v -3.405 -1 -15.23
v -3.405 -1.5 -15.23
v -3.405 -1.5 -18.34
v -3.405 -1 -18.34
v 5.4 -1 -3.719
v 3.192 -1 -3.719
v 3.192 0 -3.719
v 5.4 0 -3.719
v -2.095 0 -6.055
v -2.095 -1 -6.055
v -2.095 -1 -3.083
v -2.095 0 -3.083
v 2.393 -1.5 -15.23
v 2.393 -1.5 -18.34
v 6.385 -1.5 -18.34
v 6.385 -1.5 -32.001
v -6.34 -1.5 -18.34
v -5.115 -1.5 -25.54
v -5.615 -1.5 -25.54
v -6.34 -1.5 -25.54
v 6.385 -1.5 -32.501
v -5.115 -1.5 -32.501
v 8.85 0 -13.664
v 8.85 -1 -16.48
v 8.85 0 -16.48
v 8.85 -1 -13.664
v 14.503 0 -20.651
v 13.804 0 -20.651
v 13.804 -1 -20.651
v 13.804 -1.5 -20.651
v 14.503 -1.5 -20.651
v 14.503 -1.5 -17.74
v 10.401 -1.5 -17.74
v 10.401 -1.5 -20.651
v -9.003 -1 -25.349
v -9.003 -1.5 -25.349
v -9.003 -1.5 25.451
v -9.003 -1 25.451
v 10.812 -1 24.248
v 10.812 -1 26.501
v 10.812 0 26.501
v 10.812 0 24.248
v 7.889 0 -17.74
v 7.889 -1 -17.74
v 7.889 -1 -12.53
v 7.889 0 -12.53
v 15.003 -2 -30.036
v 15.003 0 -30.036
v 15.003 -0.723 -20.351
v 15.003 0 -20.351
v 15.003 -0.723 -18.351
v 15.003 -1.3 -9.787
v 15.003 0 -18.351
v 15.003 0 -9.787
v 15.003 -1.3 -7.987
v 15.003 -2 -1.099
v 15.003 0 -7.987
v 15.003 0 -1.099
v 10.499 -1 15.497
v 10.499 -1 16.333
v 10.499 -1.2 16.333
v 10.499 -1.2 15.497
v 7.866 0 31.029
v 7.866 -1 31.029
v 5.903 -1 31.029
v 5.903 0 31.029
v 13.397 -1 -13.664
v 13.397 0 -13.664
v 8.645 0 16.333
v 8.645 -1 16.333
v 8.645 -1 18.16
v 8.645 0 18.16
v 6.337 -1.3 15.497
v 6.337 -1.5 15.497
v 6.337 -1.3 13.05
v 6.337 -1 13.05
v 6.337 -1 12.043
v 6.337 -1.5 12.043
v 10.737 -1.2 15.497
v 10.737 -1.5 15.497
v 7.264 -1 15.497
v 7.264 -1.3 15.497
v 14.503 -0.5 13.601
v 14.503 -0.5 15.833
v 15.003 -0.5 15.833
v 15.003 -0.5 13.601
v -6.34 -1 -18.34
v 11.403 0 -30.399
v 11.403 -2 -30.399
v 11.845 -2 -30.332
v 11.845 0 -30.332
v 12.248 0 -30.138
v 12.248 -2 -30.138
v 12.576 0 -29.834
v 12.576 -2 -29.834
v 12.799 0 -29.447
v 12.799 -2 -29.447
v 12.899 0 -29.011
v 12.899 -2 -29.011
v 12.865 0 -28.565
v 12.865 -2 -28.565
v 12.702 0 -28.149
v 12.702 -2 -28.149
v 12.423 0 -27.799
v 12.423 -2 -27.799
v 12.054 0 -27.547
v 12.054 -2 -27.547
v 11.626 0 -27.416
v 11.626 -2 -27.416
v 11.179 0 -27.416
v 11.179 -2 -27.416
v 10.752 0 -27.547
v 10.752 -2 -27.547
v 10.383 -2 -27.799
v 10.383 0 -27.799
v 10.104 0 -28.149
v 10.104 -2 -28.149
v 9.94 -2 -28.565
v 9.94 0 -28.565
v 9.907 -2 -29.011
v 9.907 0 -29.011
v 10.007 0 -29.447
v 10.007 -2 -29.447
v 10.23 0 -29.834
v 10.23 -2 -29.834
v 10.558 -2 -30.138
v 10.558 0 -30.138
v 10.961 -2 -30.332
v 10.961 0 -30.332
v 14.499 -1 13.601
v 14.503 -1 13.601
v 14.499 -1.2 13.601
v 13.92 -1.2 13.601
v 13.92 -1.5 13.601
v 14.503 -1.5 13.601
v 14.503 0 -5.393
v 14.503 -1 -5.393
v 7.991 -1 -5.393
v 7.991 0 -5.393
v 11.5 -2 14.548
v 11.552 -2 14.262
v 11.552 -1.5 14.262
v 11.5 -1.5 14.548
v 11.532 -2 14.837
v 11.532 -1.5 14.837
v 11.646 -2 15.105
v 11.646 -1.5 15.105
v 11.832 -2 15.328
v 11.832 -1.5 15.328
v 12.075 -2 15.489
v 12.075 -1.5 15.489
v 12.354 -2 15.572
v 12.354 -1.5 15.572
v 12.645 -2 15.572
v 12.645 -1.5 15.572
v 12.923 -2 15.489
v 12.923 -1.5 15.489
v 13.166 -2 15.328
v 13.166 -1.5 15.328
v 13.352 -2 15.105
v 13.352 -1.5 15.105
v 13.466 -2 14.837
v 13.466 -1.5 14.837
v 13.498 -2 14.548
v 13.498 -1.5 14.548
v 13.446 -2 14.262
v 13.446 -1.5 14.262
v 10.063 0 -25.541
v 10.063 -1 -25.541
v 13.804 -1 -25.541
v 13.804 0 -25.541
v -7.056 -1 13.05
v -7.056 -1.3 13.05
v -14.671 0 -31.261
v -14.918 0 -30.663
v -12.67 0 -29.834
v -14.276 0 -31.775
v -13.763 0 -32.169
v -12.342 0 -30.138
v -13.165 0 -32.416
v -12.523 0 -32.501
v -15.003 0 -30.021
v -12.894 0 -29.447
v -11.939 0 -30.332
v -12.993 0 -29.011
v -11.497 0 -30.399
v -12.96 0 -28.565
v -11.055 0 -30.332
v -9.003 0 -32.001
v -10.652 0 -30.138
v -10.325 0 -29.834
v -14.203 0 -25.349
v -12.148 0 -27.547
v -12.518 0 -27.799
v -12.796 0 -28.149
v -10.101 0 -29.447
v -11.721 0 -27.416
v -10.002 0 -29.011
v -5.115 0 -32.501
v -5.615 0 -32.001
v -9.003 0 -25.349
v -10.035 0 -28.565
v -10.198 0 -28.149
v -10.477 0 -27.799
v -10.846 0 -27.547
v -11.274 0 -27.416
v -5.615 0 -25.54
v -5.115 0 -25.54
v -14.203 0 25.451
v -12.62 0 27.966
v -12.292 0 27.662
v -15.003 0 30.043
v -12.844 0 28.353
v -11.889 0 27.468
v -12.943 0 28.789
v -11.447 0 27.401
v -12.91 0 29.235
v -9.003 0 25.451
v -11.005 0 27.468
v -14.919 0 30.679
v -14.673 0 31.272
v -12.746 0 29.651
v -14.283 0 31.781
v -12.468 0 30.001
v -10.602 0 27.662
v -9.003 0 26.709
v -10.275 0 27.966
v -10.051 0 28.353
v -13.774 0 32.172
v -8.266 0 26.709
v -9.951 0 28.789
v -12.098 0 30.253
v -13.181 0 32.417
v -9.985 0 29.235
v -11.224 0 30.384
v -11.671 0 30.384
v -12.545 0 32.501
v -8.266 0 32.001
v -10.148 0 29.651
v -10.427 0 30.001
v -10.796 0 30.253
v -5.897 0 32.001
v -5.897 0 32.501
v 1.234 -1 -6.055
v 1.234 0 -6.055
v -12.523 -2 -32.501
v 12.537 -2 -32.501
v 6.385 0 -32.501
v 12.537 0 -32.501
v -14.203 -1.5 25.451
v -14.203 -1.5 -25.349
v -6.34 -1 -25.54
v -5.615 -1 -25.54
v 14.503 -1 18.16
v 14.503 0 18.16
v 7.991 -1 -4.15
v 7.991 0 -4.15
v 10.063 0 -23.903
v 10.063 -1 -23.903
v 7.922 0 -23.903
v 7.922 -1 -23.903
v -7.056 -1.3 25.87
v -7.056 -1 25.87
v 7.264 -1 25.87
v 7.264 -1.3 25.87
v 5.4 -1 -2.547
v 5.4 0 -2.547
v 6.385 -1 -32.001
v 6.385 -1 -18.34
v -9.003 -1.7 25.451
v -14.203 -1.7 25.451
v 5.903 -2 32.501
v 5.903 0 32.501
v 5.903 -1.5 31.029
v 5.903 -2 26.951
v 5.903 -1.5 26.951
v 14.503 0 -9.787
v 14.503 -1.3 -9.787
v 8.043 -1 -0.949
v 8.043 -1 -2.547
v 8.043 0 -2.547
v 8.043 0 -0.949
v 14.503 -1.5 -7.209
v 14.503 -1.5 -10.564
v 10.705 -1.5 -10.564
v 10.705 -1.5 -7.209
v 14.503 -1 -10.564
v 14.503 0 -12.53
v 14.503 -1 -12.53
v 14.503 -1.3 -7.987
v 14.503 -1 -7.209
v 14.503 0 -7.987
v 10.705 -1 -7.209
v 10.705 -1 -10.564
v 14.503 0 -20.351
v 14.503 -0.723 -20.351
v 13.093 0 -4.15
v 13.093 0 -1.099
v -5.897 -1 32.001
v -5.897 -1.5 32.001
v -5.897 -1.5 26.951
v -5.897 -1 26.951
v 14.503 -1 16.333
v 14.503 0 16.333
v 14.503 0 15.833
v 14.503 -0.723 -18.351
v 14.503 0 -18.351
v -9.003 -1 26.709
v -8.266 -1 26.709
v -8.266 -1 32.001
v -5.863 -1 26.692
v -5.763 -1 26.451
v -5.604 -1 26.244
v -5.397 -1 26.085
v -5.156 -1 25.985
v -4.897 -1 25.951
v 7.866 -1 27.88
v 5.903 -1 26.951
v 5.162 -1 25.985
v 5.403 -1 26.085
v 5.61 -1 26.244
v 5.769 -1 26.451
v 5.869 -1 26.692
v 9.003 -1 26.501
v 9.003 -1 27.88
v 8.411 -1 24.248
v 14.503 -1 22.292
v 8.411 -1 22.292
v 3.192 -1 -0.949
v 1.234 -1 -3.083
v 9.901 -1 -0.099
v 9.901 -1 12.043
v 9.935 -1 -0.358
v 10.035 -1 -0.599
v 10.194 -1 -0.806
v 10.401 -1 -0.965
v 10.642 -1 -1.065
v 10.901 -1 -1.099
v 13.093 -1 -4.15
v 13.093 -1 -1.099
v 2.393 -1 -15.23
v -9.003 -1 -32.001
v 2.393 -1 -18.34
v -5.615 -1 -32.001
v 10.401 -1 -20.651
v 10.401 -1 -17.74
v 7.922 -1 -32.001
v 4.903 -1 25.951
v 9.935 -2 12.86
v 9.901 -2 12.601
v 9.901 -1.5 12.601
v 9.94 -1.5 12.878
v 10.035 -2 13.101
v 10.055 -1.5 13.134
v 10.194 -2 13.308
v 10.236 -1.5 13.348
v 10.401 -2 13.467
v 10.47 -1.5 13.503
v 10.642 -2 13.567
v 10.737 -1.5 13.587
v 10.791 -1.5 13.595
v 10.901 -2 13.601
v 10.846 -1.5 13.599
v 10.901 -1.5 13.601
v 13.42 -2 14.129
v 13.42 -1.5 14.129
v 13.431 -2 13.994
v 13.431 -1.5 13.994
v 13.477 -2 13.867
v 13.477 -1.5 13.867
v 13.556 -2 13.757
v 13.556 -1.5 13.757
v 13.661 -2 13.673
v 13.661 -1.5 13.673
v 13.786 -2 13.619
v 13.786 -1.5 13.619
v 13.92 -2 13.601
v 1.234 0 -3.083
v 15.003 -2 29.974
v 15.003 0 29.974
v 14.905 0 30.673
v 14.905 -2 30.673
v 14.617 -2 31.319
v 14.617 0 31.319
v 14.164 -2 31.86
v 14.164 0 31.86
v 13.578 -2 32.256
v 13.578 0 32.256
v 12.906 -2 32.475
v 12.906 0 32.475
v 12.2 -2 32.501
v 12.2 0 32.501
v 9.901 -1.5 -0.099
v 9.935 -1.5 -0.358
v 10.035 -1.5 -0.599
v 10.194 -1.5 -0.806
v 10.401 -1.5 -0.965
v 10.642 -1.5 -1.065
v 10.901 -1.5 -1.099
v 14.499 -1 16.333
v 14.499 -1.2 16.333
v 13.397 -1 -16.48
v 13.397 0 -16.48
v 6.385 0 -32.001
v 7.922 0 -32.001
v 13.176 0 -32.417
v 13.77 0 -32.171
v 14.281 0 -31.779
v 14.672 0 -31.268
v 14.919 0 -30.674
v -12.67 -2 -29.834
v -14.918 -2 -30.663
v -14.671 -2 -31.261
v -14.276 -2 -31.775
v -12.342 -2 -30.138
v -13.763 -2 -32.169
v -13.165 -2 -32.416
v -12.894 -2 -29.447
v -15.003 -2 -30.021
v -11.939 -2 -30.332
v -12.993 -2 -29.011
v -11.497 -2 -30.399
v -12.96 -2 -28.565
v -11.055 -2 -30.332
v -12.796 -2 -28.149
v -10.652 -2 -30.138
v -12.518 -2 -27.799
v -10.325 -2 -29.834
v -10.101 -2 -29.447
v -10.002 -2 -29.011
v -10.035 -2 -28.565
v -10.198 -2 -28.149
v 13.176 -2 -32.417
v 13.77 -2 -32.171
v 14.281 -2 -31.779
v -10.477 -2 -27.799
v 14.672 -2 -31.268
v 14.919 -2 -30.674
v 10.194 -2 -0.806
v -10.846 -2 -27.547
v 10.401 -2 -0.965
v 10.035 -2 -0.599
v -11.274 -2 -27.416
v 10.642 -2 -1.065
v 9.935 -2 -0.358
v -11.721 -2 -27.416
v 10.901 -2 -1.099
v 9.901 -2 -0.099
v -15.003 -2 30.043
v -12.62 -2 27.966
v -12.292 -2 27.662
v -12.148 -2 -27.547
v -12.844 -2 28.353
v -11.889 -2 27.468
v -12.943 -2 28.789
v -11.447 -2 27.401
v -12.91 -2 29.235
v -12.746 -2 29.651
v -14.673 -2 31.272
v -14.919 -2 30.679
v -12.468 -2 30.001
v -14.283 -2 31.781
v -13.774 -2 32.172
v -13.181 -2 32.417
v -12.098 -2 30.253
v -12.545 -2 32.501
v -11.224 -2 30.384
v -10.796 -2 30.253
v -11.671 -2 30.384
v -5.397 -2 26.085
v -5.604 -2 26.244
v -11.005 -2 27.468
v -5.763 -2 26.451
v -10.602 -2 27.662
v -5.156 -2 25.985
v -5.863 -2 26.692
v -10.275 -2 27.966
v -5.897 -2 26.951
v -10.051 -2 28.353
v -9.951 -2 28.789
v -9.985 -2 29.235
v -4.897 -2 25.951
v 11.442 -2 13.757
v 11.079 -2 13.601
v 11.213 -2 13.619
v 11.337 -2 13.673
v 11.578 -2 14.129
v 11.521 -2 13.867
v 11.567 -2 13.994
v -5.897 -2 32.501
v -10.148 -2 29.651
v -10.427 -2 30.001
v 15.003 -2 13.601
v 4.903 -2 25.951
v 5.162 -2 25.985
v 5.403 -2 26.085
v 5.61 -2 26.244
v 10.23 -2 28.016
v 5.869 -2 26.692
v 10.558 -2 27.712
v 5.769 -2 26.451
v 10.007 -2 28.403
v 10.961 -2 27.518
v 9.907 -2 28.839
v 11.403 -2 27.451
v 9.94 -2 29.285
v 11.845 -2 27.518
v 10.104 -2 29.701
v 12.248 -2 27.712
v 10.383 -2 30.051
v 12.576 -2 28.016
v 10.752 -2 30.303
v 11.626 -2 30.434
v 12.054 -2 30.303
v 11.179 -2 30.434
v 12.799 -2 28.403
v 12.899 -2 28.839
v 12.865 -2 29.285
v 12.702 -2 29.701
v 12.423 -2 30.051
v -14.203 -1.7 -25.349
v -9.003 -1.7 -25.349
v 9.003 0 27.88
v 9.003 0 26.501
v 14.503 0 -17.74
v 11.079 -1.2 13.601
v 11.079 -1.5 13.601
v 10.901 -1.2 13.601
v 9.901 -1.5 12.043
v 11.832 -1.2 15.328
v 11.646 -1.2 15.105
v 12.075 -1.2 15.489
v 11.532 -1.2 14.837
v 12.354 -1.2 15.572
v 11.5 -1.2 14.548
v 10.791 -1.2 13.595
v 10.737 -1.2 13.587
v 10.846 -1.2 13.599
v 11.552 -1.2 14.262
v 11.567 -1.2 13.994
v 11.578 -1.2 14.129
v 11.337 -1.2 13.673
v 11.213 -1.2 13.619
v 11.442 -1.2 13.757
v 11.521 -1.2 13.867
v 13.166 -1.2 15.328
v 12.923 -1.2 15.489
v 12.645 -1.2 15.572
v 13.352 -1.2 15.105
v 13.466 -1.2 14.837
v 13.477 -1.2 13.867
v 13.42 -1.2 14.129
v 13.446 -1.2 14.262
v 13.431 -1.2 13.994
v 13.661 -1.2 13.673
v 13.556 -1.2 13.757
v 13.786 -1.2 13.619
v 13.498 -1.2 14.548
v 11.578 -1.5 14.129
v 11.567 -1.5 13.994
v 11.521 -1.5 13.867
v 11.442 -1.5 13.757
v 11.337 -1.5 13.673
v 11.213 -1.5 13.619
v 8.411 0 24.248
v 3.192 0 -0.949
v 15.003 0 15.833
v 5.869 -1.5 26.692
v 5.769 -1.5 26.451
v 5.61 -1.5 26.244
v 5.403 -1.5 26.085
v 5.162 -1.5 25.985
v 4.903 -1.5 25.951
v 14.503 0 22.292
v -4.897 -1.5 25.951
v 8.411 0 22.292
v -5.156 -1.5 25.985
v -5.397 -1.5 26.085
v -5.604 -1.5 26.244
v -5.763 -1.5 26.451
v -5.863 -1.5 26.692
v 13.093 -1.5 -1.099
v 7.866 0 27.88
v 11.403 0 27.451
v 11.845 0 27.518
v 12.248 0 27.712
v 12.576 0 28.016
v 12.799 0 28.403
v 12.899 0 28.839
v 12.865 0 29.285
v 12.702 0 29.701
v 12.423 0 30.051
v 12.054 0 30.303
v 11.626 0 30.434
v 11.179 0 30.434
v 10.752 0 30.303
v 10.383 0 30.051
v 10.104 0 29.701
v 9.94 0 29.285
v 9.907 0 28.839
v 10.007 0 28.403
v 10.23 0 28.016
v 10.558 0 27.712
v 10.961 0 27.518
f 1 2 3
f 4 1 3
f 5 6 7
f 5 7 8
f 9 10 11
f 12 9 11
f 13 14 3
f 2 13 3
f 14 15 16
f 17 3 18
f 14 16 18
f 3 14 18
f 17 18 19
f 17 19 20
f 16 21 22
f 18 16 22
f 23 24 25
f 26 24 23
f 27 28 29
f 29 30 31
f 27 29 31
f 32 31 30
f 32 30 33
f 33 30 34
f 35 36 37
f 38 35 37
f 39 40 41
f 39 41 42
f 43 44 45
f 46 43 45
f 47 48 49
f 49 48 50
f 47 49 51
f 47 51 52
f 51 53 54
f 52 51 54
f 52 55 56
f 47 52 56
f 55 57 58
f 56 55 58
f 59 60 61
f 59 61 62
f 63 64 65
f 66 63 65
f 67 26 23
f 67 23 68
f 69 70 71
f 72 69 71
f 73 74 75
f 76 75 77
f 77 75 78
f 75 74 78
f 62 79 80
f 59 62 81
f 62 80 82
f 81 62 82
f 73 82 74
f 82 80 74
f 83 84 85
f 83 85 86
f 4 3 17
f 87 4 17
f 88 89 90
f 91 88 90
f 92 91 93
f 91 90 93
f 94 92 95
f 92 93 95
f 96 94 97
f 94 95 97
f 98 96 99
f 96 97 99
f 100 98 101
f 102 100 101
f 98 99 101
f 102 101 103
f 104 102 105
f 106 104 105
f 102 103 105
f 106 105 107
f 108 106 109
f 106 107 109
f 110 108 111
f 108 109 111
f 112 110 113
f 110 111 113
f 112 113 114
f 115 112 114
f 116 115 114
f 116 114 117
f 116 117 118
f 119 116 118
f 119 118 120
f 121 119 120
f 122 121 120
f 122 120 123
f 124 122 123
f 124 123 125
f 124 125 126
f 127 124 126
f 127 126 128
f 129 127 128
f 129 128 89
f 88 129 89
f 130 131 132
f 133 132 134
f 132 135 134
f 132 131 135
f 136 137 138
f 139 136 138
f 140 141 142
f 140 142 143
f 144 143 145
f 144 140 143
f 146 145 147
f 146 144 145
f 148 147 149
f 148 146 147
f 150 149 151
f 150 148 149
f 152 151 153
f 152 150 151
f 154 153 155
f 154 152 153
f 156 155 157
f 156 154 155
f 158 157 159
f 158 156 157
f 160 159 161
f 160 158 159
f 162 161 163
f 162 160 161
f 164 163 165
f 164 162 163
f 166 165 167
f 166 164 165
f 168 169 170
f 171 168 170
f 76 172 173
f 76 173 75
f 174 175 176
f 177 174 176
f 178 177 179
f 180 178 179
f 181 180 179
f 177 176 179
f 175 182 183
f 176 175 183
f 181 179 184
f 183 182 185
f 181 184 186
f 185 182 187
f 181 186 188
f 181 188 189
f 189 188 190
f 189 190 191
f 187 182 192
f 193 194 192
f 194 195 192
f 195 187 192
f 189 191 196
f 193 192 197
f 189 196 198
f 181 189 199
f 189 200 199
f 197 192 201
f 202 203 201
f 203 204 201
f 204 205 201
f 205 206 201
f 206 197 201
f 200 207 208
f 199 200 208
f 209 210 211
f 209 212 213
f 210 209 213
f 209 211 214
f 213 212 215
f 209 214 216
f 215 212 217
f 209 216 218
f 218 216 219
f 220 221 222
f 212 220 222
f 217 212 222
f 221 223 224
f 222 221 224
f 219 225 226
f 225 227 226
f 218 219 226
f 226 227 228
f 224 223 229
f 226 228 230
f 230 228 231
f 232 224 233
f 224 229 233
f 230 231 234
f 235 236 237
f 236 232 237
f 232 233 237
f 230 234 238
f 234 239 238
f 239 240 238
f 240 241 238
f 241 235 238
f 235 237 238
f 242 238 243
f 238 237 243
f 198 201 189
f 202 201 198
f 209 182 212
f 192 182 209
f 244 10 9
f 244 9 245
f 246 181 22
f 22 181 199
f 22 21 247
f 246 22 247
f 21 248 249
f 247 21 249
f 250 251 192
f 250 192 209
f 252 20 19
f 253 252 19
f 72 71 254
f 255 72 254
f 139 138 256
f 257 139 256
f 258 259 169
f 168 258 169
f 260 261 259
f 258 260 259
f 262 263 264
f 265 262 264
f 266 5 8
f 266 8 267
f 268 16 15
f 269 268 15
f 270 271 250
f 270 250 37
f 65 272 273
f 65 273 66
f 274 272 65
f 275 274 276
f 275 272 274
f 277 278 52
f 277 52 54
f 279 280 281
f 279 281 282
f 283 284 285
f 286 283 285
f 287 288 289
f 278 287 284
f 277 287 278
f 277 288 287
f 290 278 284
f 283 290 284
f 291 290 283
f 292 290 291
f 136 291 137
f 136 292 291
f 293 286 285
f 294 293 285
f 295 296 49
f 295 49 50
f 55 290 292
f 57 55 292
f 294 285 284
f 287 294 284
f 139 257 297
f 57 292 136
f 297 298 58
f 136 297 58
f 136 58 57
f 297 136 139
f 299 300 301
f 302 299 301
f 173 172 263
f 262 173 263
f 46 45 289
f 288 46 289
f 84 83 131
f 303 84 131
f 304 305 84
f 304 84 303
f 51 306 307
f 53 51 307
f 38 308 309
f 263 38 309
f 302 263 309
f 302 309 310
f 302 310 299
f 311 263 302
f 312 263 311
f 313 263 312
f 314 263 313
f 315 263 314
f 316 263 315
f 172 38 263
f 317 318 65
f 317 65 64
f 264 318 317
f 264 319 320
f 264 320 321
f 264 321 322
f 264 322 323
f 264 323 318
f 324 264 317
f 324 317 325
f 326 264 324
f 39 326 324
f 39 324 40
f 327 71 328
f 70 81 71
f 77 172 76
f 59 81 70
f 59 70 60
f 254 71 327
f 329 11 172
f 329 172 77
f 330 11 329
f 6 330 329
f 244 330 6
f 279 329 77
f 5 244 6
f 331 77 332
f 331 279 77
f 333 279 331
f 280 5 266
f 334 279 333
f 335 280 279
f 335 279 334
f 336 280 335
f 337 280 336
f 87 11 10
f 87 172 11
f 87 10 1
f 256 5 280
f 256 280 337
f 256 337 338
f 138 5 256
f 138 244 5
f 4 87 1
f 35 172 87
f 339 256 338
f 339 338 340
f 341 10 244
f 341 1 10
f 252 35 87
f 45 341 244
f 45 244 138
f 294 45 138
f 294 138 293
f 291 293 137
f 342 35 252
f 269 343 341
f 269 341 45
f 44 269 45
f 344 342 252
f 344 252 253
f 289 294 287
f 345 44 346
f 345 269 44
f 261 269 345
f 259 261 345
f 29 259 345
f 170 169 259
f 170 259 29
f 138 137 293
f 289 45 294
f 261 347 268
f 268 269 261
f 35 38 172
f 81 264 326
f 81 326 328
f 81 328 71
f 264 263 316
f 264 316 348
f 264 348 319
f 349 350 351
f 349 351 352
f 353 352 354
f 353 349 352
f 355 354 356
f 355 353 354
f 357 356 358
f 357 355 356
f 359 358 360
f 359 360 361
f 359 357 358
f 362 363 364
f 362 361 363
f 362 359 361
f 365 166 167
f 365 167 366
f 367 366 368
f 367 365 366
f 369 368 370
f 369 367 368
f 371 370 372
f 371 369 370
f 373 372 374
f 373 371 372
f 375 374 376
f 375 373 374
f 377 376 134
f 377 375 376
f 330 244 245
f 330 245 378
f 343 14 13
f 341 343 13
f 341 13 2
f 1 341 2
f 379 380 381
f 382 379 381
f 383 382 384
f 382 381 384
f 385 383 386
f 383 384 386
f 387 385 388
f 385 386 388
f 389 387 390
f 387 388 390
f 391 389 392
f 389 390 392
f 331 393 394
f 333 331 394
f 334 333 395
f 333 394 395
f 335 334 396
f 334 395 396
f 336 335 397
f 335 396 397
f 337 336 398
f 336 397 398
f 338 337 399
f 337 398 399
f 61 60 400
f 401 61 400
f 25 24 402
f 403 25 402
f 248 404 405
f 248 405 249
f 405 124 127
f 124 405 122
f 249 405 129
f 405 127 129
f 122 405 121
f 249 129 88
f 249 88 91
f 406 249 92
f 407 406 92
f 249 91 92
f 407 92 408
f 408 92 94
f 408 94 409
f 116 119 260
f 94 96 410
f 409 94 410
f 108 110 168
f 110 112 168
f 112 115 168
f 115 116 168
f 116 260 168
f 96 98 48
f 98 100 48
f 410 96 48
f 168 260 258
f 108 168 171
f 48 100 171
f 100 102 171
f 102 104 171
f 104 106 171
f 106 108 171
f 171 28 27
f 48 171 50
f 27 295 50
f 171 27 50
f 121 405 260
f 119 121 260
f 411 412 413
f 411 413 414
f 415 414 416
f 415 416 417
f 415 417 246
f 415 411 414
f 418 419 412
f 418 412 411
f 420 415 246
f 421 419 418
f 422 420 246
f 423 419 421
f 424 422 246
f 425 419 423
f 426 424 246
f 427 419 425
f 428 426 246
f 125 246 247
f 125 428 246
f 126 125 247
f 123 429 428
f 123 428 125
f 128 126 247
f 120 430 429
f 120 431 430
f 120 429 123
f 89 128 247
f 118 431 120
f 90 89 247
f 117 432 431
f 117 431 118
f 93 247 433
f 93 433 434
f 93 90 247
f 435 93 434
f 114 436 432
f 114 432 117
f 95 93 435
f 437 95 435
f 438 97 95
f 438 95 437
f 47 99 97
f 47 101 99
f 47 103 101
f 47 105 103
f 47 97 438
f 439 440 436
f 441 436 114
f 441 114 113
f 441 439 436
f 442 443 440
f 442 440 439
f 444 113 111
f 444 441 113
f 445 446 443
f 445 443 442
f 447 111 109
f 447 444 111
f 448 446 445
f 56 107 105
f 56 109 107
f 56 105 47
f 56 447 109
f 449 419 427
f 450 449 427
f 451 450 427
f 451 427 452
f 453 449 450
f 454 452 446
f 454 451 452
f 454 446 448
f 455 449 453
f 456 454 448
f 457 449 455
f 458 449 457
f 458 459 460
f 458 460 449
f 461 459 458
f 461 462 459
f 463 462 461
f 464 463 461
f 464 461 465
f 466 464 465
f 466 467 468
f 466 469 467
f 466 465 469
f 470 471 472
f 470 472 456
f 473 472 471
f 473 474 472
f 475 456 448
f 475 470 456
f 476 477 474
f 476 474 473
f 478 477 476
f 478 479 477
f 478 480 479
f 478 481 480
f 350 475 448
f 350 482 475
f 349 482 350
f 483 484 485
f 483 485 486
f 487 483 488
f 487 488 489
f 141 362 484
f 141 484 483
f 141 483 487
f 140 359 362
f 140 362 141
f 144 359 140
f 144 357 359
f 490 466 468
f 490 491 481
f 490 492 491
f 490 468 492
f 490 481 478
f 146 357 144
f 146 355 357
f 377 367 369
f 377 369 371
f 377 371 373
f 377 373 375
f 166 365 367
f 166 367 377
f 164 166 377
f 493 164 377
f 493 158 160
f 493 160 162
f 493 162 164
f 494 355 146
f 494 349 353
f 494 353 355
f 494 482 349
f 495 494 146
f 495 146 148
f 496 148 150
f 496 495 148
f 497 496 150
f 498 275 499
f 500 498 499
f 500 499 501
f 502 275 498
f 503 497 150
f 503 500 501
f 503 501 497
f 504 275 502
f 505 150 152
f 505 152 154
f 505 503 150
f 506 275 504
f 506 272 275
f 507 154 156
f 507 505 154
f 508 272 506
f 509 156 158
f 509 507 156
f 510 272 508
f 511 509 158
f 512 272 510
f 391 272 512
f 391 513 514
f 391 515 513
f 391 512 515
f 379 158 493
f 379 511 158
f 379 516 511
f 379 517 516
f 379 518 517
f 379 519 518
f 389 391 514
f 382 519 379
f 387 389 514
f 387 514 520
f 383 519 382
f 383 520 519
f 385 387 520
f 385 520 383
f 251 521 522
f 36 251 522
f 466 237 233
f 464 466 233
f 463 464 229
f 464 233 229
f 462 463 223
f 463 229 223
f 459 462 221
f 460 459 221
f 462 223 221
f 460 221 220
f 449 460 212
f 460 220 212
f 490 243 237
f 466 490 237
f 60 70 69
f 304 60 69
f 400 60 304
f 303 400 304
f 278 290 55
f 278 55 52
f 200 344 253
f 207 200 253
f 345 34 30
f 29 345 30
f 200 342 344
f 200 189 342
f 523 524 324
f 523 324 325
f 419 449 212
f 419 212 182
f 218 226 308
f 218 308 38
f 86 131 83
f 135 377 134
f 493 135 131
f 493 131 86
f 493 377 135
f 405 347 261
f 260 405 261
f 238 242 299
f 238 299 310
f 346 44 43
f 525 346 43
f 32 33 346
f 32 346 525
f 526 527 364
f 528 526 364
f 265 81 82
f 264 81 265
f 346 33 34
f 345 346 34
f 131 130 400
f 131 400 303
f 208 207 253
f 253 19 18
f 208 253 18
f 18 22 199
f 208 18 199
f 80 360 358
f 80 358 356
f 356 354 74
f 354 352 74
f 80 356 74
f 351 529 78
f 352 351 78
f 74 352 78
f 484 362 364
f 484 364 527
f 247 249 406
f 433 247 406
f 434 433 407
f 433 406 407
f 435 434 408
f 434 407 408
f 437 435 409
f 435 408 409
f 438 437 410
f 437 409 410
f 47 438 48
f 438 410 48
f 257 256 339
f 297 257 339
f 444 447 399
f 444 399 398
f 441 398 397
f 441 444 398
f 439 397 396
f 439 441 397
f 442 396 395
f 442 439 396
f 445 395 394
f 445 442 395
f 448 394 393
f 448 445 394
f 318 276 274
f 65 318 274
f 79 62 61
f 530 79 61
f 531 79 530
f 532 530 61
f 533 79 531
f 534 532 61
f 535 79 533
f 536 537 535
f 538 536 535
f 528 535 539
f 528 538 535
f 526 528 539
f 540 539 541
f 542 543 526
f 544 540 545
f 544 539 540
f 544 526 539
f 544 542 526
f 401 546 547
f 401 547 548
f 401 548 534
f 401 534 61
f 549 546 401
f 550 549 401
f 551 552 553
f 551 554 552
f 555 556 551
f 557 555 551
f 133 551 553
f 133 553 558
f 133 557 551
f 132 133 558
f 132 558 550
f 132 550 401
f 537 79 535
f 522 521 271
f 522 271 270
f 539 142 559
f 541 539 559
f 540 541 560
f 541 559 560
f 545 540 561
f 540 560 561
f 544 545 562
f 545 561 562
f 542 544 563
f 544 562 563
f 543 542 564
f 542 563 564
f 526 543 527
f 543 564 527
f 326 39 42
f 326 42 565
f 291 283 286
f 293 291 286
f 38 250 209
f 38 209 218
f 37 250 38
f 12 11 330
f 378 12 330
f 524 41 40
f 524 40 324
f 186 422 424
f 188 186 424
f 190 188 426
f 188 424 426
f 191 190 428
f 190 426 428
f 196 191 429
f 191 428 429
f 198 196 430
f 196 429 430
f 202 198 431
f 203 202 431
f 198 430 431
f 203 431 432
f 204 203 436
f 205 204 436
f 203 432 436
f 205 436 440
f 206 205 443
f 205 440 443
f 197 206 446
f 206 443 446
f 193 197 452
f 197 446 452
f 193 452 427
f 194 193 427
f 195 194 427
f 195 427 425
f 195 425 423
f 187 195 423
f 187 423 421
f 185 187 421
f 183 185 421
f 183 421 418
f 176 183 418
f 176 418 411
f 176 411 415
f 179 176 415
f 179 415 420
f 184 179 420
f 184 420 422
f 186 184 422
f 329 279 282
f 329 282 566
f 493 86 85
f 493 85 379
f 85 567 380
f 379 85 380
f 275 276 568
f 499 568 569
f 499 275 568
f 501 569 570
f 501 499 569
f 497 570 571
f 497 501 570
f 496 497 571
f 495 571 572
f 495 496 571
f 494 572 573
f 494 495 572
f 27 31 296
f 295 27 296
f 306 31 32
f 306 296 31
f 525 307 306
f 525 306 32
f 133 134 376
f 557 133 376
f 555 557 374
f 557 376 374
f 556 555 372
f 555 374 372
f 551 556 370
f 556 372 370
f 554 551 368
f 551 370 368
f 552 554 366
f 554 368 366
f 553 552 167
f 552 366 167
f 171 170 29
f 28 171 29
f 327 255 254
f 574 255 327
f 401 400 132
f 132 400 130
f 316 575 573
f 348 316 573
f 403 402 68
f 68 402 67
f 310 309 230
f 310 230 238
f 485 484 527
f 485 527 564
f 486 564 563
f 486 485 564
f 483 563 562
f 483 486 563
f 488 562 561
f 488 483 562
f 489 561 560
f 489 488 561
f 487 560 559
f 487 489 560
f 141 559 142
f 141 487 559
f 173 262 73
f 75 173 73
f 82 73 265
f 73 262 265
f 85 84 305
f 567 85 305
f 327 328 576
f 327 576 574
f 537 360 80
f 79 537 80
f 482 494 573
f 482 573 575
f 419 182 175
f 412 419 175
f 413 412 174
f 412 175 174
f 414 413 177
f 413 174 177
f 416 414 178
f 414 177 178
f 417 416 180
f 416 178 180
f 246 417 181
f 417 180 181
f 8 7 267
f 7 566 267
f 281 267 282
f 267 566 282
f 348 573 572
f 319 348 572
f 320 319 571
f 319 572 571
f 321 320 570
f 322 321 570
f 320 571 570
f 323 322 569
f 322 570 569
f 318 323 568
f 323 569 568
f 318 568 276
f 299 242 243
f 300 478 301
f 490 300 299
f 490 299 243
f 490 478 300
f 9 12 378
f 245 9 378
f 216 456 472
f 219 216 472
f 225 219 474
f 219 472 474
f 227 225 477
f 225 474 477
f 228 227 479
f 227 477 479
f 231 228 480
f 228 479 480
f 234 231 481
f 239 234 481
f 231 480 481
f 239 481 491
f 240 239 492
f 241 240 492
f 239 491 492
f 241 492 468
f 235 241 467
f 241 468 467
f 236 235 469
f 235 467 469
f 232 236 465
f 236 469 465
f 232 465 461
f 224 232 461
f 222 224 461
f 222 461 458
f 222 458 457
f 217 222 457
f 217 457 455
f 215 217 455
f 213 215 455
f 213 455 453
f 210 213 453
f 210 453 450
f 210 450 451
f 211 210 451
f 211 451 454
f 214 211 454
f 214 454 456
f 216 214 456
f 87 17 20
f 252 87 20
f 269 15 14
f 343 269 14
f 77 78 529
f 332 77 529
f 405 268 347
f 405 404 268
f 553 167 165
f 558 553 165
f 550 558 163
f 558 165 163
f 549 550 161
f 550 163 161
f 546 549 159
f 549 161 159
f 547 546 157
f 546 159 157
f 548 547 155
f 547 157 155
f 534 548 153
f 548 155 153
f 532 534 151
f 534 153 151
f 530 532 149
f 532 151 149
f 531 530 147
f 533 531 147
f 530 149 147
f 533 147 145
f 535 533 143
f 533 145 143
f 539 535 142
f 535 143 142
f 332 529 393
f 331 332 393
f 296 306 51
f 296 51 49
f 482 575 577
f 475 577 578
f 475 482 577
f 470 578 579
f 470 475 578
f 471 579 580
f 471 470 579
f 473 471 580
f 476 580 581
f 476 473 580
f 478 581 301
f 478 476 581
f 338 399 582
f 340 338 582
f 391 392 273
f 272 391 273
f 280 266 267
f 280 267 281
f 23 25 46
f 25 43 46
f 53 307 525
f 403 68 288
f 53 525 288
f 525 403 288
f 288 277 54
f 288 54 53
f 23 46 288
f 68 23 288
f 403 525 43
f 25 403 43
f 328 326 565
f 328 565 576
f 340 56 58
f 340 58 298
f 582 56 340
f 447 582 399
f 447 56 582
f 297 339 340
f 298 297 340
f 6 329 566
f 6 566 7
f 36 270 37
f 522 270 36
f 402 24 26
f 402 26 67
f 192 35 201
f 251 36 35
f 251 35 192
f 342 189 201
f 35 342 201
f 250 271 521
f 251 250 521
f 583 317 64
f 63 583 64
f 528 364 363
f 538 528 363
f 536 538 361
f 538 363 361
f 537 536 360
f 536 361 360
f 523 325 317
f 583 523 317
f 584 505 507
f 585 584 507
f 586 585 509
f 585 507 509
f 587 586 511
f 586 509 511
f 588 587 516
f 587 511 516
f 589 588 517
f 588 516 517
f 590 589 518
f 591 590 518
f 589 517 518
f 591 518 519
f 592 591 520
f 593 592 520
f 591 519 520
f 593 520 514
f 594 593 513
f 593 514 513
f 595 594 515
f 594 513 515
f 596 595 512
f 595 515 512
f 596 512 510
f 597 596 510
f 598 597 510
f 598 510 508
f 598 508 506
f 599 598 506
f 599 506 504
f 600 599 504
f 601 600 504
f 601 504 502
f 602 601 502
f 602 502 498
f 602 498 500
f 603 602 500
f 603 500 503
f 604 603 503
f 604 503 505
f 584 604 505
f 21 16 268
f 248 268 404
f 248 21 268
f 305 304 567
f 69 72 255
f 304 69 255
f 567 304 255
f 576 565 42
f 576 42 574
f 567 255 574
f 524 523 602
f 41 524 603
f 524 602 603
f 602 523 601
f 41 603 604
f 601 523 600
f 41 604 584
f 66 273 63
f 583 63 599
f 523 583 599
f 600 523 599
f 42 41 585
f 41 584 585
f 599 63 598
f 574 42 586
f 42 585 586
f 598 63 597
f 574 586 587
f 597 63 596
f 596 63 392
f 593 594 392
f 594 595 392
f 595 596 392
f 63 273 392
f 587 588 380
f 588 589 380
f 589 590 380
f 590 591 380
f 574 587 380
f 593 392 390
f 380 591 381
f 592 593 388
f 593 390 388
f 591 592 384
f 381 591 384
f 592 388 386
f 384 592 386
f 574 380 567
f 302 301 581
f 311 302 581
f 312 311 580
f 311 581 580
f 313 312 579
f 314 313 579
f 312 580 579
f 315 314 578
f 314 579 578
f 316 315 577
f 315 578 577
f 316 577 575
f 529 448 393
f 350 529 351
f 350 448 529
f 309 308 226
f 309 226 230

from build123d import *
from build123d.topology import SkipClean

# Parameters (mm, degrees)
BOSS_EXTRUDE1_DEPTH      = 2
SHELL1_T                 = -0.5
BOSS_EXTRUDE3_START      = 1.5
BOSS_EXTRUDE3_DEPTH      = 1.5
SKETCH7_R                = 1.5
CUT_EXTRUDE4_DEPTH       = 36.864526101
CUT_EXTRUDE5_DEPTH       = 36.864526101
CUT_EXTRUDE6_REACH       = 68.754
SKETCH9_W                = 11.5
SKETCH9_H                = 1.5
SKETCH10_W               = 0.73665
SKETCH10_H               = 5.291922
SKETCH10_W_2             = 6.6138774
SKETCH10_H_2             = 5.2104
SKETCH10_W_3             = 4.547646
SKETCH10_H_3             = 2.8161
SKETCH10_W_4             = 5.857488
SKETCH10_H_4             = 1.826866
SKETCH10_W_5             = 0.5
SKETCH10_H_5             = 6.4607
SKETCH10_W_6             = 3.3297711
SKETCH10_H_6             = 2.9719988
BOSS_EXTRUDE4_DEPTH      = 2
SKETCH12_W               = 4.547646
SKETCH12_H               = 2.8161
BOSS_EXTRUDE6_DEPTH      = 0.5
CUT_EXTRUDE7_DEPTH       = 0.5
CUT_EXTRUDE7_DEPTH_BACK  = 36.828818463
SKETCH13_W               = 14.320116
SKETCH13_H               = 12.819992
CUT_EXTRUDE8_START       = -0.5
CUT_EXTRUDE8_OUTLINE_W   = 1.8
CUT_EXTRUDE8_OUTLINE_H   = 1.3
CUT_EXTRUDE8_OUTLINE_W_2 = 2
CUT_EXTRUDE8_OUTLINE_H_2 = 0.722717803
CUT_EXTRUDE8_DEPTH       = 0.5
CUT_EXTRUDE9_DEPTH       = 36.84012043
CUT_EXTRUDE9_DEPTH_BACK  = 0.2
SKETCH15_W               = 5.2
SKETCH15_H               = 50.8
SKETCH16_W               = 4.000248
SKETCH16_H               = 3.499868
CUT_EXTRUDE10_DEPTH      = 0.2
CUT_EXTRUDE11_START      = -0.5
CUT_EXTRUDE11_OUTLINE_W  = 2.232012
CUT_EXTRUDE11_OUTLINE_H  = 0.5
CUT_EXTRUDE11_DEPTH      = 0.5


# Read off the part's stored shape, not the designer's step: Cut-Extrude8, Cut-Extrude11
with BuildPart() as part:
    # Sketch1 → Boss-Extrude1 (new body)
    with BuildSketch(Plane.XZ):
        with BuildLine():
            Line((-15.002764, 30.043374), (-15.002764, -30.021276))
            ThreePointArc((-15.002764, -30.021276), (-14.276432231, -31.77467184), (-12.522962, -32.500824))
            Line((-12.522962, -32.500824), (12.53744, -32.500824))
            ThreePointArc((12.53744, -32.500824), (14.280687318, -31.778747318), (15.002764, -30.0355))
            Line((15.002764, -30.0355), (15.002764, 29.973524))
            ThreePointArc((15.002764, 29.973524), (14.163585126, 31.860357898), (12.200382, 32.500824))
            Line((12.200382, 32.500824), (-12.54506, 32.500824))
            ThreePointArc((-12.54506, 32.500824), (-14.282828873, 31.781068474), (-15.002764, 30.043374))
        make_face()
    extrude(amount=BOSS_EXTRUDE1_DEPTH)

    # Shell1
    shell1_openings = [part.faces().sort_by_distance(p)[0] for p in [
        (-0.00028204, 0, -0.000340146),
    ]]
    offset(amount=SHELL1_T, openings=shell1_openings, kind=Kind.INTERSECTION)

    # Sketch6 → Boss-Extrude3 (add)
    with BuildSketch(Plane(origin=(0, -1.5, 0), x_dir=(1, 0, 0), z_dir=(0, 1, 0)).offset(BOSS_EXTRUDE3_START)):
        with BuildLine():
            Line((-9.002764, 32.500824), (-9.002764, 26.500824))
            Line((-9.002764, 26.500824), (-15.002764, 26.500824))
            Line((-15.002764, 26.500824), (-15.002764, 30.021276))
            ThreePointArc((-15.002764, 30.021276), (-14.276432231, 31.77467184), (-12.522962, 32.500824))
            Line((-12.522962, 32.500824), (-9.002764, 32.500824))
        make_face()
        with BuildLine():
            Line((9.002764, 32.500824), (9.002764, 26.500824))
            Line((9.002764, 26.500824), (15.002764, 26.500824))
            Line((15.002764, 26.500824), (15.002764, 30.0355))
            ThreePointArc((15.002764, 30.0355), (14.280687318, 31.778747318), (12.53744, 32.500824))
            Line((12.53744, 32.500824), (9.002764, 32.500824))
        make_face()
        with BuildLine():
            Line((15.002764, -26.500824), (9.002764, -26.500824))
            Line((9.002764, -26.500824), (9.002764, -32.500824))
            Line((9.002764, -32.500824), (12.200382, -32.500824))
            ThreePointArc((12.200382, -32.500824), (14.163585126, -31.860357898), (15.002764, -29.973524))
            Line((15.002764, -29.973524), (15.002764, -26.500824))
        make_face()
        with BuildLine():
            Line((-12.54506, -32.500824), (-9.002764, -32.500824))
            Line((-9.002764, -32.500824), (-9.002764, -26.500824))
            Line((-9.002764, -26.500824), (-15.002764, -26.500824))
            Line((-15.002764, -26.500824), (-15.002764, -30.043374))
            ThreePointArc((-15.002764, -30.043374), (-14.282828873, -31.781068474), (-12.54506, -32.500824))
        make_face()
    extrude(amount=-BOSS_EXTRUDE3_DEPTH)

    # Sketch7 → Cut-Extrude4 (cut, through all)
    with BuildSketch(Plane.XZ.offset(2)):
        with Locations(Location((-11.447272, 28.901136, 0), (0, 0, 270))):
            Circle(SKETCH7_R)
        with Locations(Location((11.402822, 28.951174, 0), (0, 0, 270))):
            Circle(SKETCH7_R)
        with Locations(Location((11.402822, -28.89885, 0), (0, 0, 270))):
            Circle(SKETCH7_R)
        with Locations(Location((-11.49731, -28.89885, 0), (0, 0, 270))):
            Circle(SKETCH7_R)
    extrude(amount=-CUT_EXTRUDE4_DEPTH, mode=Mode.SUBTRACT)

    # Sketch8 → Cut-Extrude5 (cut, through all)
    with BuildSketch(Plane.XZ.offset(2)):
        with BuildLine():
            Line((-5.897236, 32.500824), (5.902764, 32.500824))
            Line((5.902764, 32.500824), (5.902764, 26.950824))
            ThreePointArc((5.902764, 26.950824), (5.609870781, 26.243717219), (4.902764, 25.950824))
            Line((4.902764, 25.950824), (-4.897236, 25.950824))
            ThreePointArc((-4.897236, 25.950824), (-5.604342781, 26.243717219), (-5.897236, 26.950824))
            Line((-5.897236, 26.950824), (-5.897236, 32.500824))
        make_face()
        with BuildLine():
            Line((15.002764, 13.600824), (15.002764, -1.099176))
            Line((15.002764, -1.099176), (10.901247394, -1.099176))
            ThreePointArc((10.901247394, -1.099176), (10.194140612, -0.806282781), (9.901247394, -0.099176))
            Line((9.901247394, -0.099176), (9.901247394, 12.600824))
            ThreePointArc((9.901247394, 12.600824), (10.194140612, 13.307930781), (10.901247394, 13.600824))
            Line((10.901247394, 13.600824), (11.078663245, 13.600824))
            ThreePointArc((11.078663245, 13.600824), (11.485078263, 13.809573535), (11.552137497, 14.261516667))
            ThreePointArc((11.552137497, 14.261516667), (12.499086, 15.582902), (13.446034503, 14.261516667))
            ThreePointArc((13.446034503, 14.261516667), (13.513093737, 13.809573535), (13.919508755, 13.600824))
            Line((13.919508755, 13.600824), (15.002764, 13.600824))
        make_face()
    extrude(amount=-CUT_EXTRUDE5_DEPTH, mode=Mode.SUBTRACT)

    # Sketch9 → Cut-Extrude6 (cut, up to next)
    with BuildSketch(Plane(origin=(0, 0, -32.500824), x_dir=(-1, 0, 0), z_dir=(0, 0, -1)), mode=Mode.PRIVATE) as cut_extrude6_sk1:
        with Locations((-0.634594, -0.75)):
            Rectangle(SKETCH9_W, SKETCH9_H)
    cut_extrude6_tool1 = extrude(cut_extrude6_sk1.sketch, amount=-CUT_EXTRUDE6_REACH, mode=Mode.PRIVATE) & part.part
    add(cut_extrude6_tool1.solids().sort_by_distance((0.634594, -0.75, -32.500824))[0], mode=Mode.SUBTRACT)

    # Sketch10 → Boss-Extrude4 (add)
    # profile 1 of 11: a face of its own
    with BuildSketch(Plane.XZ.offset(2)):
        Polygon((-14.202764, -25.3492), (-14.202764, 25.4508), (-11.922316, 25.4508), (-11.422316, 25.4508), (-9.002764, 25.4508), (-9.002764, 26.500824), (-15.002764, 26.500824), (-15.002764, -26.500824), (-9.002764, -26.500824), (-9.002764, -25.3492), (-11.422316, -25.3492), (-11.922316, -25.3492), align=None)
    # profile 2 of 11: a face of its own
    with BuildSketch(Plane.XZ.offset(2)):
        Polygon((7.991286, -5.393498), (7.991286, -4.150298), (13.092686, -4.150298), (13.092686, -1.099176), (14.502764, -1.099176), (14.502764, -5.393498), align=None)
    # profile 3 of 11: a face of its own
    with BuildSketch(Plane.XZ.offset(2)):
        Polygon((14.502764, 26.500824), (10.8122863, 26.500824), (10.8122863, 24.2477014), (8.410686, 24.2477014), (8.410686, 22.2917026), (14.502764, 22.2917026), align=None)
    # profile 4 of 11: a face of its own
    with BuildSketch(Plane.XZ.offset(2)):
        Polygon((9.002764, 32.000824), (9.002764, 27.879702), (7.865886, 27.879702), (7.865886, 31.029302), (5.902764, 31.029302), (5.902764, 32.000824), align=None)
    # profile 5 of 11: a face of its own
    with BuildSketch(Plane.XZ.offset(2)):
        with Locations((-8.634439, 29.354863)):
            Rectangle(SKETCH10_W, SKETCH10_H)
    # profile 6 of 11: a face of its own
    with BuildSketch(Plane.XZ.offset(2)):
        with Locations((11.1958253, -15.135098)):
            Rectangle(SKETCH10_W_2, SKETCH10_H_2)
        with Locations((11.123663, -15.071852)):
            Rectangle(SKETCH10_W_3, SKETCH10_H_3, mode=Mode.SUBTRACT)
    # profile 7 of 11: a face of its own
    with BuildSketch(Plane.XZ.offset(2)):
        with Locations((11.57402, 17.246269)):
            Rectangle(SKETCH10_W_4, SKETCH10_H_4)
    # profile 8 of 11: a face of its own
    with BuildSketch(Plane.XZ.offset(2)):
        with Locations((-5.365406, -28.770474)):
            Rectangle(SKETCH10_W_5, SKETCH10_H_5)
    # profile 9 of 11: a face of its own
    with BuildSketch(Plane.XZ.offset(2)):
        Polygon((9.002764, -32.000824), (7.921932, -32.000824), (7.921932, -23.902698), (10.06259, -23.902698), (10.06259, -25.540744), (13.803886, -25.540744), (13.803886, -20.651498), (14.502764, -20.651498), (14.502764, -26.500824), (9.002764, -26.500824), align=None)
    # profile 10 of 11: a face of its own
    with BuildSketch(Plane.XZ.offset(2)):
        Polygon((3.192286, -3.719498), (5.399886, -3.719498), (5.399886, -2.547098), (8.043086, -2.547098), (8.043086, -0.9490986), (3.192286, -0.9490986), align=None)
    # profile 11 of 11: a face of its own
    with BuildSketch(Plane.XZ.offset(2)):
        with Locations((-0.43060015, -4.568698)):
            Rectangle(SKETCH10_W_6, SKETCH10_H_6)
    extrude(amount=-BOSS_EXTRUDE4_DEPTH)

    # Sketch12 → Boss-Extrude6 (add)
    with SkipClean():  # the faces are left unmerged after this step: merging them gives an invalid solid
        with BuildSketch(Plane(origin=(0, -1.5, 0), x_dir=(1, 0, 0), z_dir=(0, 1, 0))):
            with BuildLine():
                Line((14.502764, 7.209380255), (10.705486, 7.209380255))
                Line((10.705486, 7.209380255), (10.705486, 10.564015745))
                Line((10.705486, 10.564015745), (14.502764, 10.564015745))
                Line((14.502764, 10.564015745), (14.502764, 12.529898))
                Line((14.502764, 12.529898), (7.8888866, 12.529898))
                Line((7.8888866, 12.529898), (7.8888866, 17.740298))
                Line((7.8888866, 17.740298), (10.400724, 17.740298))
                Line((10.400724, 17.740298), (10.400724, 20.651498))
                Line((10.400724, 20.651498), (13.803886, 20.651498))
                Line((13.803886, 20.651498), (13.803886, 25.540744))
                Line((13.803886, 25.540744), (10.06259, 25.540744))
                Line((10.06259, 25.540744), (10.06259, 23.902698))
                Line((10.06259, 23.902698), (7.921932, 23.902698))
                Line((7.921932, 23.902698), (7.921932, 32.000824))
                Line((7.921932, 32.000824), (6.384594, 32.000824))
                Line((6.384594, 32.000824), (6.384594, 18.340124))
                Line((6.384594, 18.340124), (2.393486, 18.340124))
                Line((2.393486, 18.340124), (2.393486, 15.229798))
                Line((2.393486, 15.229798), (-3.404914, 15.229798))
                Line((-3.404914, 15.229798), (-3.404914, 18.340124))
                Line((-3.404914, 18.340124), (-6.340406, 18.340124))
                Line((-6.340406, 18.340124), (-6.340406, 25.540124))
                Line((-6.340406, 25.540124), (-5.615406, 25.540124))
                Line((-5.615406, 25.540124), (-5.615406, 32.000824))
                Line((-5.615406, 32.000824), (-9.002764, 32.000824))
                Line((-9.002764, 32.000824), (-9.002764, -26.708902))
                Line((-9.002764, -26.708902), (-8.266114, -26.708902))
                Line((-8.266114, -26.708902), (-8.266114, -32.000824))
                Line((-8.266114, -32.000824), (-5.897236, -32.000824))
                Line((-5.897236, -32.000824), (-5.897236, -26.950824))
                ThreePointArc((-5.897236, -26.950824), (-5.604342781, -26.243717219), (-4.897236, -25.950824))
                Line((-4.897236, -25.950824), (4.902764, -25.950824))
                ThreePointArc((4.902764, -25.950824), (5.609870781, -26.243717219), (5.902764, -26.950824))
                Line((5.902764, -26.950824), (5.902764, -31.029302))
                Line((5.902764, -31.029302), (7.865886, -31.029302))
                Line((7.865886, -31.029302), (7.865886, -27.879702))
                Line((7.865886, -27.879702), (9.002764, -27.879702))
                Line((9.002764, -27.879702), (9.002764, -26.500824))
                Line((9.002764, -26.500824), (10.8122863, -26.500824))
                Line((10.8122863, -26.500824), (10.8122863, -24.2477014))
                Line((10.8122863, -24.2477014), (8.410686, -24.2477014))
                Line((8.410686, -24.2477014), (8.410686, -22.2917026))
                Line((8.410686, -22.2917026), (14.502764, -22.2917026))
                Line((14.502764, -22.2917026), (14.502764, -18.159702))
                Line((14.502764, -18.159702), (8.645276, -18.159702))
                Line((8.645276, -18.159702), (8.645276, -16.332836))
                Line((8.645276, -16.332836), (14.502764, -16.332836))
                Line((14.502764, -16.332836), (14.502764, -13.600824))
                Line((14.502764, -13.600824), (13.919508755, -13.600824))
                ThreePointArc((13.919508755, -13.600824), (13.513093737, -13.809573535), (13.446034503, -14.261516667))
                ThreePointArc((13.446034503, -14.261516667), (12.499086, -15.582902), (11.552137497, -14.261516667))
                ThreePointArc((11.552137497, -14.261516667), (11.485078263, -13.809573535), (11.078663245, -13.600824))
                Line((11.078663245, -13.600824), (10.901247394, -13.600824))
                ThreePointArc((10.901247394, -13.600824), (10.818684818, -13.597409882), (10.736686, -13.587190842))
                Line((10.736686, -13.587190842), (10.736686, -15.497047053))
                Line((10.736686, -15.497047053), (6.336686, -15.497047053))
                Line((6.336686, -15.497047053), (6.336686, -12.043156947))
                Line((6.336686, -12.043156947), (9.901247394, -12.043156947))
                Line((9.901247394, -12.043156947), (9.901247394, 0.099176))
                ThreePointArc((9.901247394, 0.099176), (10.194140612, 0.806282781), (10.901247394, 1.099176))
                Line((10.901247394, 1.099176), (13.092686, 1.099176))
                Line((13.092686, 1.099176), (13.092686, 4.150298))
                Line((13.092686, 4.150298), (7.991286, 4.150298))
                Line((7.991286, 4.150298), (7.991286, 5.393498))
                Line((7.991286, 5.393498), (14.502764, 5.393498))
                Line((14.502764, 5.393498), (14.502764, 7.209380255))
            make_face()
            with Locations((11.123663, 15.071852)):
                Rectangle(SKETCH12_W, SKETCH12_H)
        extrude(amount=BOSS_EXTRUDE6_DEPTH)

    # Sketch13 → Cut-Extrude7 (cut, two sides: drawn at the far end of the back side and taken through both)
    with SkipClean():  # the faces are left unmerged after this step: merging them gives an invalid solid
        with BuildSketch(Plane.XZ.offset(0.8).offset(-CUT_EXTRUDE7_DEPTH_BACK)):
            with Locations((0.103886, 19.459702)):
                Rectangle(SKETCH13_W, SKETCH13_H)
        extrude(amount=CUT_EXTRUDE7_DEPTH + CUT_EXTRUDE7_DEPTH_BACK, mode=Mode.SUBTRACT)

    # Cut-Extrude8 outline → Cut-Extrude8 (cut)
    with SkipClean():  # the faces are left unmerged after this step: merging them gives an invalid solid
        with BuildSketch(Plane(origin=(15.002764, 0, 0), x_dir=(0, 0, -1), z_dir=(1, 0, 0)).offset(CUT_EXTRUDE8_START)):
            with Locations((8.886698, -0.65)):
                Rectangle(CUT_EXTRUDE8_OUTLINE_W, CUT_EXTRUDE8_OUTLINE_H)
            with Locations((19.351498, -0.361358901)):
                Rectangle(CUT_EXTRUDE8_OUTLINE_W_2, CUT_EXTRUDE8_OUTLINE_H_2)
        extrude(amount=CUT_EXTRUDE8_DEPTH, mode=Mode.SUBTRACT)

    # Sketch15 → Cut-Extrude9 (cut, two sides: drawn at the far end of the back side and taken through both)
    with SkipClean():  # the faces are left unmerged after this step: merging them gives an invalid solid
        with BuildSketch(Plane(origin=(0, -1.5, 0), x_dir=(1, 0, 0), z_dir=(0, 1, 0)).offset(-CUT_EXTRUDE9_DEPTH_BACK)):
            with Locations((-11.602764, -0.0508)):
                Rectangle(SKETCH15_W, SKETCH15_H)
        extrude(amount=CUT_EXTRUDE9_DEPTH + CUT_EXTRUDE9_DEPTH_BACK, mode=Mode.SUBTRACT)

    # Sketch16 → Cut-Extrude10 (cut)
    with SkipClean():  # the faces are left unmerged after this step: merging them gives an invalid solid
        with BuildSketch(Plane(origin=(0, -1, 0), x_dir=(1, 0, 0), z_dir=(0, 1, 0))):
            with Locations((12.499086, -14.582902)):
                Rectangle(SKETCH16_W, SKETCH16_H)
        extrude(amount=-CUT_EXTRUDE10_DEPTH, mode=Mode.SUBTRACT)

    # Cut-Extrude11 outline → Cut-Extrude11 (cut)
    with SkipClean():  # the faces are left unmerged after this step: merging them gives an invalid solid
        with BuildSketch(Plane(origin=(15.002764, 0, 0), x_dir=(0, 0, -1), z_dir=(1, 0, 0)).offset(CUT_EXTRUDE11_START)):
            with Locations((-14.71683, -0.25)):
                Rectangle(CUT_EXTRUDE11_OUTLINE_W, CUT_EXTRUDE11_OUTLINE_H)
        extrude(amount=CUT_EXTRUDE11_DEPTH, mode=Mode.SUBTRACT)


solid = part.part
